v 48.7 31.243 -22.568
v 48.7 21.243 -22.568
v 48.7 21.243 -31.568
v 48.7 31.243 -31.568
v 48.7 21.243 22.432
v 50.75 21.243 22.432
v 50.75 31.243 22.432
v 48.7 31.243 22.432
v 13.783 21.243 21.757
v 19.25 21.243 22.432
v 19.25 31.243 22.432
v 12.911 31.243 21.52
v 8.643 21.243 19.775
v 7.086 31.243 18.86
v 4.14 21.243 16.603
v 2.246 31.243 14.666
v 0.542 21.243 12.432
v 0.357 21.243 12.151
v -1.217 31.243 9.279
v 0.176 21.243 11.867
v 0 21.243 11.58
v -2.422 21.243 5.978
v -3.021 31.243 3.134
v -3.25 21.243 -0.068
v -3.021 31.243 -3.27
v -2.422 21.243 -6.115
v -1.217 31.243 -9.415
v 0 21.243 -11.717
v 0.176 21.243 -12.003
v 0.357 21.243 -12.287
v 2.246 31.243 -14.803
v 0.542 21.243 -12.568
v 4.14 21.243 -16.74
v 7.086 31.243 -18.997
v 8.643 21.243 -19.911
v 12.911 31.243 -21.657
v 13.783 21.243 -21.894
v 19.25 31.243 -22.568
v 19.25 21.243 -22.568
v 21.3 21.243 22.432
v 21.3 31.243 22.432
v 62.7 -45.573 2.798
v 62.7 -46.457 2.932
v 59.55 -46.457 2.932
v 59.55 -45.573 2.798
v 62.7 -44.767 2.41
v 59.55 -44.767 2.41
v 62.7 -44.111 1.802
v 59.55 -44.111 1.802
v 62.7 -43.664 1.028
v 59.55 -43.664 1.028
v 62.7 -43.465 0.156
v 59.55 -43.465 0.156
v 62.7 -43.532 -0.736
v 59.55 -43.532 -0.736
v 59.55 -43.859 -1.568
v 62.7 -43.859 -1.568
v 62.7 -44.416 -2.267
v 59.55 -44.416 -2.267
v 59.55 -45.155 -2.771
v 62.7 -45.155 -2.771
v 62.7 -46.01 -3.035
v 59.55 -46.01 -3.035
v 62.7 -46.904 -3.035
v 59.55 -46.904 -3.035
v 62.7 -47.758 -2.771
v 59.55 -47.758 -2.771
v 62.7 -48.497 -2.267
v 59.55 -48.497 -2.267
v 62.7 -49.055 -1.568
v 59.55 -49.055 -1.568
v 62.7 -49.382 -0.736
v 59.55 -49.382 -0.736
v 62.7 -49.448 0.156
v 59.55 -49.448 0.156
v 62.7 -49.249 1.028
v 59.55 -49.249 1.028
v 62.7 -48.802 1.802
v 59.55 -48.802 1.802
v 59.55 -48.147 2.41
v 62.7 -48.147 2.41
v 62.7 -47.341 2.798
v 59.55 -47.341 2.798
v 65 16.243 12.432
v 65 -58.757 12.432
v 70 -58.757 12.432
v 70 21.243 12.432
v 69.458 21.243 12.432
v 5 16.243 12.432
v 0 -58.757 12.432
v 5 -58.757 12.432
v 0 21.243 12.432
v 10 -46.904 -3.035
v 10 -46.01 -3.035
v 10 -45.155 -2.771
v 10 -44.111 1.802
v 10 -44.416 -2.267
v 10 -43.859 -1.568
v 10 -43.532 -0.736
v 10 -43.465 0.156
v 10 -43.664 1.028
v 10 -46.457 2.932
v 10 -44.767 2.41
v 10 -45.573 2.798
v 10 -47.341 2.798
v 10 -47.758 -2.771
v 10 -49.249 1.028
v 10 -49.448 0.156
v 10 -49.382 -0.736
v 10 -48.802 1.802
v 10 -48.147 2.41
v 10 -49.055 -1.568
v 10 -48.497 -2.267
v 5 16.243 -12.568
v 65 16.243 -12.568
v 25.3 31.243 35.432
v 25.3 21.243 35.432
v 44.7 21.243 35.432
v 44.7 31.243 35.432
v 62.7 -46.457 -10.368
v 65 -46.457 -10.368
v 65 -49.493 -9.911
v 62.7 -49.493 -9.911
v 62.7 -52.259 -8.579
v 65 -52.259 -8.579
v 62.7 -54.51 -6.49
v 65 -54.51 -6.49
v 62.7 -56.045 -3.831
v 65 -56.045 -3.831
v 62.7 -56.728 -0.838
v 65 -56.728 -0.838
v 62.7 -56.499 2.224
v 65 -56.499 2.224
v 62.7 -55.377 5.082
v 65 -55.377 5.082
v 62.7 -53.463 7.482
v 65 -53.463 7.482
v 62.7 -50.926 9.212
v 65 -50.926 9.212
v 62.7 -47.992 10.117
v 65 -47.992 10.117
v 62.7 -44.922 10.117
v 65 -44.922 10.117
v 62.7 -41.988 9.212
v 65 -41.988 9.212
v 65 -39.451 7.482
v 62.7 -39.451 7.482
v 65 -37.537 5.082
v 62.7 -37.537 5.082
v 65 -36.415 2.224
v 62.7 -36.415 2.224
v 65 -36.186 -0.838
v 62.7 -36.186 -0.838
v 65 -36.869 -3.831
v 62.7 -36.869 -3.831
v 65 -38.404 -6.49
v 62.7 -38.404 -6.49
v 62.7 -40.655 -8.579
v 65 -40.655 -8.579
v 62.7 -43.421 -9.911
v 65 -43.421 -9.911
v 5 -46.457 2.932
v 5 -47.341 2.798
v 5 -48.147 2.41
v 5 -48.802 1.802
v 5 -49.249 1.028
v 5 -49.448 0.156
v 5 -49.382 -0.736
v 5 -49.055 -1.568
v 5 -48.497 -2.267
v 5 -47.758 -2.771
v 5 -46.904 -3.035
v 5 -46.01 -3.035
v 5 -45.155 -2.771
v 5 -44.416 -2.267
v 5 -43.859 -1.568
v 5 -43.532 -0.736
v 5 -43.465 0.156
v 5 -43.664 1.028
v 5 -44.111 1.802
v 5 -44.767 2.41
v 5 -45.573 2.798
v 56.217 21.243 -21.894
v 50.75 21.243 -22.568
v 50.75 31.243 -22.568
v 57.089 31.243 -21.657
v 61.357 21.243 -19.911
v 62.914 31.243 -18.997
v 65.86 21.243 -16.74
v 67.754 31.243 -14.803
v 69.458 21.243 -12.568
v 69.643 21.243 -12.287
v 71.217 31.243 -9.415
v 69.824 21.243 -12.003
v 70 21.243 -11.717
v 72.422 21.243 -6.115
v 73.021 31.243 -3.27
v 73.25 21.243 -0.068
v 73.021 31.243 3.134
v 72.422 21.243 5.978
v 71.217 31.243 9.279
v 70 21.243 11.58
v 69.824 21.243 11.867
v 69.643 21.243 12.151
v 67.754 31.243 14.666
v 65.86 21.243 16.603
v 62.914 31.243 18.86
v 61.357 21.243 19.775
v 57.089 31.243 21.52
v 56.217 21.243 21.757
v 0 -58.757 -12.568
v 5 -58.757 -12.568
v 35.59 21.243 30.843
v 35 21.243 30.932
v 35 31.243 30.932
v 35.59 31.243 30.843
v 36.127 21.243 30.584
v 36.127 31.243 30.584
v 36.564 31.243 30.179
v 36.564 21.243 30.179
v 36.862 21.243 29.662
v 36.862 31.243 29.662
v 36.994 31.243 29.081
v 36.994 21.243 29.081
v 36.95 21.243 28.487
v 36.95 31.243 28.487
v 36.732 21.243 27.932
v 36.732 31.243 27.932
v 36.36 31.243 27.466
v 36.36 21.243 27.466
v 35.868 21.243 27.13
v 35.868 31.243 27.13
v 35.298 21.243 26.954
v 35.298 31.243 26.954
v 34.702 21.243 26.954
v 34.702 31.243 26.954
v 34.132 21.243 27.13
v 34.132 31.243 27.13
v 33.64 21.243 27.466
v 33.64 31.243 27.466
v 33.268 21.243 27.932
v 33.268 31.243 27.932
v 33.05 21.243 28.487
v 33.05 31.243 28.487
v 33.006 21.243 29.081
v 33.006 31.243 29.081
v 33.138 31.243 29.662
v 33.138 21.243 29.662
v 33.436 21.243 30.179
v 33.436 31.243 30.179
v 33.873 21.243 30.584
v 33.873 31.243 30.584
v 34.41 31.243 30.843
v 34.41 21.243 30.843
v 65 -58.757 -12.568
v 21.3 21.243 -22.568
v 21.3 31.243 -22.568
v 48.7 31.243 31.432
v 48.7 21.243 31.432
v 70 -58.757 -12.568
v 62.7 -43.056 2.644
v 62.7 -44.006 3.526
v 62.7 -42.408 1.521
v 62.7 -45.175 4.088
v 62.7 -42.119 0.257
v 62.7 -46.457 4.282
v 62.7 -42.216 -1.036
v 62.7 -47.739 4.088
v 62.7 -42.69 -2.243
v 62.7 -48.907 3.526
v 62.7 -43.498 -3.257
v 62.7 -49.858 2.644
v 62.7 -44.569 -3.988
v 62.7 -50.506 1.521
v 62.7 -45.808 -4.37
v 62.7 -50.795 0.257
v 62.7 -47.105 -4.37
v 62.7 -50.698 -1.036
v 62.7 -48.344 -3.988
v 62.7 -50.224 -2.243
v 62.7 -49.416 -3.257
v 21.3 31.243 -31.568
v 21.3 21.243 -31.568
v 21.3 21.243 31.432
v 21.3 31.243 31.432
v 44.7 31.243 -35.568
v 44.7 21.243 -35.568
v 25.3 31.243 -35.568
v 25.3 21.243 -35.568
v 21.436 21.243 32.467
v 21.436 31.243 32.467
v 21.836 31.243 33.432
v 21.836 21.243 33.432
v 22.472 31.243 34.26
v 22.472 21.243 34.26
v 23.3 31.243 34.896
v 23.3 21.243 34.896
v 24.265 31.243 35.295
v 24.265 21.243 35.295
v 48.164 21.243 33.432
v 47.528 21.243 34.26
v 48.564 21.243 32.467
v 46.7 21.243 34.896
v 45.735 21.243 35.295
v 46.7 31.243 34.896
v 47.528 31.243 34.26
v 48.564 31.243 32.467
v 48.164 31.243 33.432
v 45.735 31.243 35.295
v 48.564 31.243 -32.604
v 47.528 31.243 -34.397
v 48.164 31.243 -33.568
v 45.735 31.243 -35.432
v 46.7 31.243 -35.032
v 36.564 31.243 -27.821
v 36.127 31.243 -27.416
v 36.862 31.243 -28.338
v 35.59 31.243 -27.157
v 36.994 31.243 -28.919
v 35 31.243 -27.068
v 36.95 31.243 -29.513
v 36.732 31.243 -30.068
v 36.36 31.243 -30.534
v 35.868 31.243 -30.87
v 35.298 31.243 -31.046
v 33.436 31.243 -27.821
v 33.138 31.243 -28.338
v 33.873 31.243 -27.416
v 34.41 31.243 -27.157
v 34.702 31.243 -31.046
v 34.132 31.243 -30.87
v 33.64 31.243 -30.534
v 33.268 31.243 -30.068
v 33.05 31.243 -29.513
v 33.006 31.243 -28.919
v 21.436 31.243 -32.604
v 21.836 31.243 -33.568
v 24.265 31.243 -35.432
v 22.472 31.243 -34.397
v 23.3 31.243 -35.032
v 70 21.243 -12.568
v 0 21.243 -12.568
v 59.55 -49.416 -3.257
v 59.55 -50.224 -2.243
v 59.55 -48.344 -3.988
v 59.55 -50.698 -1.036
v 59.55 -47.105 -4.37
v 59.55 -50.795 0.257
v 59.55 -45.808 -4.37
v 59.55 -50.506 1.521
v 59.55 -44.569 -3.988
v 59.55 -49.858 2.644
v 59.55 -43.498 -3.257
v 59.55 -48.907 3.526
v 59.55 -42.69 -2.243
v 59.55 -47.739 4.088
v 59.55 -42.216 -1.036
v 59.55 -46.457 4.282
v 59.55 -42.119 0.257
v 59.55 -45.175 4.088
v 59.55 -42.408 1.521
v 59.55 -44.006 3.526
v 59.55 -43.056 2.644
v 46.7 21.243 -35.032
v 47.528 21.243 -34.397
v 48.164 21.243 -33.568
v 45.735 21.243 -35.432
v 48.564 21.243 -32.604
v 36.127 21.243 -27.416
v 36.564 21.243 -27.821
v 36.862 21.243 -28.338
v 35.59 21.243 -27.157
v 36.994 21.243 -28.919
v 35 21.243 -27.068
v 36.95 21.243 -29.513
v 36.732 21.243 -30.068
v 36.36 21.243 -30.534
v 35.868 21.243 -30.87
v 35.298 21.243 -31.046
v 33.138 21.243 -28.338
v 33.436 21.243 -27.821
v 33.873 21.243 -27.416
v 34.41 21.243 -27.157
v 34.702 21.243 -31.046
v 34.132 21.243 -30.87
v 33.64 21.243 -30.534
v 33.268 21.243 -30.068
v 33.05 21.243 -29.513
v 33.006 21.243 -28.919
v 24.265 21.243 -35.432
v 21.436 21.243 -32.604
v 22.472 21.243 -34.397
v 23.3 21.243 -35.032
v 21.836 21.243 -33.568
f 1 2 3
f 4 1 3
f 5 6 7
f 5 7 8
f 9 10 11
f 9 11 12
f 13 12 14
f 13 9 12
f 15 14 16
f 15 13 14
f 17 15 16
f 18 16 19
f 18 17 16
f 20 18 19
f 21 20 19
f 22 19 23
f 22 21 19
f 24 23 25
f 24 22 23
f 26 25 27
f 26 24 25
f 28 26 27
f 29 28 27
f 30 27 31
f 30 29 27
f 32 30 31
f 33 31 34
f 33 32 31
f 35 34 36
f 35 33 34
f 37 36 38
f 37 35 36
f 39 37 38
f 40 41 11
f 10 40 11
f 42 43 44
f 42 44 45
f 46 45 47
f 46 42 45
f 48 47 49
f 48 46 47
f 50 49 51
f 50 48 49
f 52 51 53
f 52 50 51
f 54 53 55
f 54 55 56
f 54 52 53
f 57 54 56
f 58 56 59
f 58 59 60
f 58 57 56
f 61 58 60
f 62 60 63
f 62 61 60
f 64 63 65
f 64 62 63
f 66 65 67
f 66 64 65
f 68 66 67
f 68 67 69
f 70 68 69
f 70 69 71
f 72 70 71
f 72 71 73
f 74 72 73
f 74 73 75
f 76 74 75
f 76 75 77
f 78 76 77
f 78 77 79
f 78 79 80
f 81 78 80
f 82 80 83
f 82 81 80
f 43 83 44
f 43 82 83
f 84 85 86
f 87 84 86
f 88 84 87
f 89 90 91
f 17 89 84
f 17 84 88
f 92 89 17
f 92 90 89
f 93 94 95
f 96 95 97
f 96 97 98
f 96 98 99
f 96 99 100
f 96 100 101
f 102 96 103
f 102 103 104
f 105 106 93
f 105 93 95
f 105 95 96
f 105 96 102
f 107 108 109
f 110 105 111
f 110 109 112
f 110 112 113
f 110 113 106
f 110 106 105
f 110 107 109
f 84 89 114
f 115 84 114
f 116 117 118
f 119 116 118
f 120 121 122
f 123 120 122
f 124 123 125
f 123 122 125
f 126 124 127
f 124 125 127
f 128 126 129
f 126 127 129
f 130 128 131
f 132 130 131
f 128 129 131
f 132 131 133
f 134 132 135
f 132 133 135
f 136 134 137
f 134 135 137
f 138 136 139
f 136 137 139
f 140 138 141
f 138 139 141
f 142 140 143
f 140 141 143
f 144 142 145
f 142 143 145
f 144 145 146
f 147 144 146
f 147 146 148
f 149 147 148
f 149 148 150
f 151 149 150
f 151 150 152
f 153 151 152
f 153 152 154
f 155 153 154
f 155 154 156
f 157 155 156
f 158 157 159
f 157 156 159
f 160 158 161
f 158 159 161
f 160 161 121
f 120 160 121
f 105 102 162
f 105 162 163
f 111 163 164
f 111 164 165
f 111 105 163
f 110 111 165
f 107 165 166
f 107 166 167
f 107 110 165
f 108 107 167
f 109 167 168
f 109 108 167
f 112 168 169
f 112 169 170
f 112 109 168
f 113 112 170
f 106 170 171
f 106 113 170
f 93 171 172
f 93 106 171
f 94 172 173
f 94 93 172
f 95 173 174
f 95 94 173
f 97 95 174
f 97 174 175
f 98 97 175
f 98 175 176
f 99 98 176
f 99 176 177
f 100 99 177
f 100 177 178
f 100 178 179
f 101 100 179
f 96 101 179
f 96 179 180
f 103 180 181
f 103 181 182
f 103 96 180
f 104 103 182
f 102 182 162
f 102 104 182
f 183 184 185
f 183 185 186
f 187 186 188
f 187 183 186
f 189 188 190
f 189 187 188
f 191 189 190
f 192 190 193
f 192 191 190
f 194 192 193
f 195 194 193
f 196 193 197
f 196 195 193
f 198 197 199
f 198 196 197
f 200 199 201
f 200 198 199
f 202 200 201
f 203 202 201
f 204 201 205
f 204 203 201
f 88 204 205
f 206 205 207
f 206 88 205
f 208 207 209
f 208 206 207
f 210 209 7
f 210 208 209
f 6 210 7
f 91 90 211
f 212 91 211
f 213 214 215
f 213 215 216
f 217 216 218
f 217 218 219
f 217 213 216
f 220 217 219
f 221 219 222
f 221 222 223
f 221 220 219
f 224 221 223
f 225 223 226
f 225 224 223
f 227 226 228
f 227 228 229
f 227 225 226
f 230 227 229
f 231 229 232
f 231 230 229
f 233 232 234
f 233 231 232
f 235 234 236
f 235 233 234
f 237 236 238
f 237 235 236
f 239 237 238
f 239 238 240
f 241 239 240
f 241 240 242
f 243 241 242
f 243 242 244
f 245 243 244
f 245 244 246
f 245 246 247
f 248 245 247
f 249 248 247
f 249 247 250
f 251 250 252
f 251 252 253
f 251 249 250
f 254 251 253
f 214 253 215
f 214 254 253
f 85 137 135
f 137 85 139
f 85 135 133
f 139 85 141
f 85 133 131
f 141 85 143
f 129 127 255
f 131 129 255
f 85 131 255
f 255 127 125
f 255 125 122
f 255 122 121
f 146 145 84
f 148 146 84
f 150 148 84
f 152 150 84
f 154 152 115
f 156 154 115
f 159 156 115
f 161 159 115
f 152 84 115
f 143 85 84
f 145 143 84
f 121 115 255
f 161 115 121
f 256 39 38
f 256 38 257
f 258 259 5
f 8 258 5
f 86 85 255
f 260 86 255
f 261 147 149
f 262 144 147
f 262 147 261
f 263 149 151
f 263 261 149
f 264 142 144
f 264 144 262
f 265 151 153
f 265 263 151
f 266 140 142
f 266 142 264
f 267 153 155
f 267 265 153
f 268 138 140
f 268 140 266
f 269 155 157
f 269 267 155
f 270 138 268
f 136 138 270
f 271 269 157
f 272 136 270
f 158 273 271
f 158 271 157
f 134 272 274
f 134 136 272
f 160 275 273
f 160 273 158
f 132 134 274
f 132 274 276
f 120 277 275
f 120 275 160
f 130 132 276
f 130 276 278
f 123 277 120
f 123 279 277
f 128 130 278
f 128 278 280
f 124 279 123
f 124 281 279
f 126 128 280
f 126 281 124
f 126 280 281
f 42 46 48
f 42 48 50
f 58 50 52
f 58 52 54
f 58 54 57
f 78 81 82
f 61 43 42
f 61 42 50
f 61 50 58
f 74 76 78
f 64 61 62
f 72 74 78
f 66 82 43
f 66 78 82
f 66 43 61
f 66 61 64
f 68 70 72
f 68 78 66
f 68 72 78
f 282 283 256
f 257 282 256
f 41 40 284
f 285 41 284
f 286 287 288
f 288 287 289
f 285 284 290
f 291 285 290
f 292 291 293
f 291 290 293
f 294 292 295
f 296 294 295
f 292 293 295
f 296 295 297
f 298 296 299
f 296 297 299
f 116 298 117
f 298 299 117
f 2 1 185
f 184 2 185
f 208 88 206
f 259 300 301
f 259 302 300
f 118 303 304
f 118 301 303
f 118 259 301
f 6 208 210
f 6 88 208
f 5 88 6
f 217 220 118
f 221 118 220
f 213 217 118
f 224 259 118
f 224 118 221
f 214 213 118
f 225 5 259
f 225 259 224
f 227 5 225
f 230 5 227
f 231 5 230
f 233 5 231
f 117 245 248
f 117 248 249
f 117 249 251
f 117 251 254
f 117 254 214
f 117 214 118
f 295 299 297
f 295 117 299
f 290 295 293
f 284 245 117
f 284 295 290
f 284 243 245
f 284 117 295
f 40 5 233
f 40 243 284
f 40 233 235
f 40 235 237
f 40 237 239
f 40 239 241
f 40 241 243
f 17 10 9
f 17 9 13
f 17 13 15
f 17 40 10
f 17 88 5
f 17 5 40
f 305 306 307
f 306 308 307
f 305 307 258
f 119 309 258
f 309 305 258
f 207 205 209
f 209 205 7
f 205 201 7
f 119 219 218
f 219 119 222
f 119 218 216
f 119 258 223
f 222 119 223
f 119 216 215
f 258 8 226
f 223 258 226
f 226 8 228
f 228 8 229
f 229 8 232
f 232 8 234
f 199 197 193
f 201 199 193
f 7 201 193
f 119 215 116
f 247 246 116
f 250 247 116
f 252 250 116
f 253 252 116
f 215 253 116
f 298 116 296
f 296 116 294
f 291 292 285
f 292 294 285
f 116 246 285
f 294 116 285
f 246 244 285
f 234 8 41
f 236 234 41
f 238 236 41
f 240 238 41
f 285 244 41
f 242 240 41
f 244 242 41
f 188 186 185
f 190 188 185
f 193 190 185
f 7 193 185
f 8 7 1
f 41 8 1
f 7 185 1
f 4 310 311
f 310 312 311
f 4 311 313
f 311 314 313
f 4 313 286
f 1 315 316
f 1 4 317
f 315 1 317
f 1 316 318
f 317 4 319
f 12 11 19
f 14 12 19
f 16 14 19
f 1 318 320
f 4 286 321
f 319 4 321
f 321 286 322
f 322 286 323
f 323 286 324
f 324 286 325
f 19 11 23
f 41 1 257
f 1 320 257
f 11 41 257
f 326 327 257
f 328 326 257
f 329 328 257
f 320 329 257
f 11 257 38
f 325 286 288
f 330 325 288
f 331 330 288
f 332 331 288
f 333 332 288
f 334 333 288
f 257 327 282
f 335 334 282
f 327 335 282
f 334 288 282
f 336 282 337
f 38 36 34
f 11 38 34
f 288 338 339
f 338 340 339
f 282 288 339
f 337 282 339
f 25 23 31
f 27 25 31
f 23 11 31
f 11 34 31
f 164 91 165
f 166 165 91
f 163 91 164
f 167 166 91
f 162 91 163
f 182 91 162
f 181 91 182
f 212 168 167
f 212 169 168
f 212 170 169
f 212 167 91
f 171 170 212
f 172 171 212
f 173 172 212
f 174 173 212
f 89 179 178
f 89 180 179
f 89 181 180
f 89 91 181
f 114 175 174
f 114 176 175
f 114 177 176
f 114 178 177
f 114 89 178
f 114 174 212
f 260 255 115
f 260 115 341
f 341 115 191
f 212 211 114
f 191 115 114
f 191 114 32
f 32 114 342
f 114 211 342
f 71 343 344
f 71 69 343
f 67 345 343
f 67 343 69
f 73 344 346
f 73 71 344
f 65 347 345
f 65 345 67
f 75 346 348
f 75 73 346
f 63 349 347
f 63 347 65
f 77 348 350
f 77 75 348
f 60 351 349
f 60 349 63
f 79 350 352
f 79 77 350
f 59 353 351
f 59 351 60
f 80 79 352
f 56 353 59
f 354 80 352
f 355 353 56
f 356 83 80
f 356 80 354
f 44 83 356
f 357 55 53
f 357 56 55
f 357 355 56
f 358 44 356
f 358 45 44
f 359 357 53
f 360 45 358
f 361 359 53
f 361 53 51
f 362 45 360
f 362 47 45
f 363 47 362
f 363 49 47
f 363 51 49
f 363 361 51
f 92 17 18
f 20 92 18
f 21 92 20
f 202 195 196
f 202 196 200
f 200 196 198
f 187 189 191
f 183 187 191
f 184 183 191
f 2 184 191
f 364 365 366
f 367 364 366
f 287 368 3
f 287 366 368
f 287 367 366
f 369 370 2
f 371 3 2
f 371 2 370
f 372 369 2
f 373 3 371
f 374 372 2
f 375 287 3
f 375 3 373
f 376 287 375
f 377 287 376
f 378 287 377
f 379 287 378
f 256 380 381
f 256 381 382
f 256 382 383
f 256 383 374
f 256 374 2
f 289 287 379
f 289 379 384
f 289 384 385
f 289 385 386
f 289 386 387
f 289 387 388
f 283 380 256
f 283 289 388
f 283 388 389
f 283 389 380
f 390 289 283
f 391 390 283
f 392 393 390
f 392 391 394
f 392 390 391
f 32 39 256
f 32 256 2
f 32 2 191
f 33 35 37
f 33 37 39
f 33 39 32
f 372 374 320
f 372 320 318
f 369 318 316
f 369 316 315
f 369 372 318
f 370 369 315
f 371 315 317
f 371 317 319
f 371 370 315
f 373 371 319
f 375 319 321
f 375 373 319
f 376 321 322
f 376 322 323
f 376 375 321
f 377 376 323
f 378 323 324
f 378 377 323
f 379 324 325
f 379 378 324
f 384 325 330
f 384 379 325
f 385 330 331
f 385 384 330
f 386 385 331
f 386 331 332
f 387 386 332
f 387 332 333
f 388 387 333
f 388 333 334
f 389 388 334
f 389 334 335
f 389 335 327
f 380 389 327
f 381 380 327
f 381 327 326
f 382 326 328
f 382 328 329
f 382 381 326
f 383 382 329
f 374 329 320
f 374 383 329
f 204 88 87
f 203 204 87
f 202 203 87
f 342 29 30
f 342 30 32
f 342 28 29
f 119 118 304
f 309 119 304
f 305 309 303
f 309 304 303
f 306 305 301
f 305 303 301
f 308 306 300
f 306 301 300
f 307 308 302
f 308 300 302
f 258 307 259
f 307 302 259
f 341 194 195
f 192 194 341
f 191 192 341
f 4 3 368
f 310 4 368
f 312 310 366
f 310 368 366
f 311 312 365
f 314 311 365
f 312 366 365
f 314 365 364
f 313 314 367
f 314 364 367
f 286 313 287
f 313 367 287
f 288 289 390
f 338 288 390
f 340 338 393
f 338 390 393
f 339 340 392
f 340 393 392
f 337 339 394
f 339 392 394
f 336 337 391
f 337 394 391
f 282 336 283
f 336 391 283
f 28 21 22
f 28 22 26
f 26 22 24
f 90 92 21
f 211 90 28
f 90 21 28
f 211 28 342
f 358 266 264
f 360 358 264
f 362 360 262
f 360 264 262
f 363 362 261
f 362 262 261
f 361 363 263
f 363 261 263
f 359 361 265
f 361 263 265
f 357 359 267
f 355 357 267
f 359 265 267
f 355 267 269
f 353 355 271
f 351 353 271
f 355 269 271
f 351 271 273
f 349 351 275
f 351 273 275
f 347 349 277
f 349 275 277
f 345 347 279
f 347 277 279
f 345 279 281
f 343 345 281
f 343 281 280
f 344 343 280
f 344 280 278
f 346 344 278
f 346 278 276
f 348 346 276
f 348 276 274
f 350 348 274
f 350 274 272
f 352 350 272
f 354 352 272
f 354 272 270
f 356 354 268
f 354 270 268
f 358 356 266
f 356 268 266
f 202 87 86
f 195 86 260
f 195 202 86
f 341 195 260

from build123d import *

# Parameters (mm, degrees)
SKETCH_1_W       = 25
SKETCH_1_H       = 80
EXTRUDE_1_DEPTH  = 5
SKETCH_8_W       = 25
SKETCH_8_H       = 5
EXTRUDE_6_DEPTH  = 60
SKETCH_9_W       = 25
SKETCH_9_H       = 80
EXTRUDE_7_DEPTH  = 5
SKETCH_10_R      = 10.3
EXTRUDE_9_DEPTH  = 2.3
SKETCH_12_R      = 4.35
SKETCH_12_R_2    = 3
EXTRUDE_10_DEPTH = 3.15
EXTRUDE_START    = 5
SKETCH_13_R      = 3
EXTRUDE_11_DEPTH = 5
SKETCH_15_R      = 2
EXTRUDE_12_DEPTH = 10


with BuildPart() as part:
    # 草圖1 → 填料-伸長1 (new body)
    with BuildSketch(Plane(origin=(0, 0, 0), x_dir=(0, 0, -1), z_dir=(1, 0, 0))):
        with Locations((0.068306011, -18.756830601)):
            Rectangle(SKETCH_1_W, SKETCH_1_H)
    extrude(amount=EXTRUDE_1_DEPTH)

    # 草圖8 → 填料-伸長6 (add)
    with BuildSketch(Plane(origin=(5, 0, 0), x_dir=(0, 0, -1), z_dir=(1, 0, 0))):
        with Locations((0.068306011, 18.743169399)):
            Rectangle(SKETCH_8_W, SKETCH_8_H)
    extrude(amount=EXTRUDE_6_DEPTH)

    # 草圖9 → 填料-伸長7 (add)
    with BuildSketch(Plane(origin=(65, 0, 0), x_dir=(0, 0, -1), z_dir=(1, 0, 0))):
        with Locations((0.068306011, -18.756830601)):
            Rectangle(SKETCH_9_W, SKETCH_9_H)
    extrude(amount=EXTRUDE_7_DEPTH)

    # 草圖10 → 填料-伸長9 (add)
    with BuildSketch(Plane.ZY.offset(-65)):
        with Locations(Location((-0.068306011, -46.456830601, 0), (0, 0, 180))):
            Circle(SKETCH_10_R)
    extrude(amount=EXTRUDE_9_DEPTH)

    # 草圖12 → 填料-伸長10 (add)
    with BuildSketch(Plane.ZY.offset(-62.7)):
        with Locations((-0.068306011, -46.456830601)):
            Circle(SKETCH_12_R)
        with Locations((-0.068306011, -46.456830601)):
            Circle(SKETCH_12_R_2, mode=Mode.SUBTRACT)
    extrude(amount=EXTRUDE_10_DEPTH)

    # 草圖13 → 填料-伸長11 (add)
    with BuildSketch(Plane(origin=(5, 0, 0), x_dir=(0, 0, -1), z_dir=(1, 0, 0)).offset(EXTRUDE_START)):
        with Locations(Location((0.068306011, -46.456830601, 0), (0, 0, 180))):
            Circle(SKETCH_13_R)
    extrude(amount=-EXTRUDE_11_DEPTH)

    # 草圖15 → 填料-伸長12 (add)
    # profile 1 of 3: a face of its own
    with BuildSketch(Plane(origin=(0, 21.243169399, 0), x_dir=(1, 0, 0), z_dir=(0, 1, 0))):
        with BuildLine():
            Line((19.25, 22.568306011), (50.75, 22.568306011))
            ThreePointArc((50.75, 22.568306011), (73.25, 0.068306011), (50.75, -22.431693989))
            Line((50.75, -22.431693989), (19.25, -22.431693989))
            ThreePointArc((19.25, -22.431693989), (-3.25, 0.068306011), (19.25, 22.568306011))
        make_face()
    # profile 2 of 3: a face of its own
    with BuildSketch(Plane(origin=(0, 21.243169399, 0), x_dir=(1, 0, 0), z_dir=(0, 1, 0))):
        with BuildLine():
            Line((48.7, -22.431693989), (21.3, -22.431693989))
            Line((21.3, -22.431693989), (21.3, -31.431693989))
            ThreePointArc((21.3, -31.431693989), (22.471572875, -34.260121114), (25.3, -35.431693989))
            Line((25.3, -35.431693989), (44.7, -35.431693989))
            ThreePointArc((44.7, -35.431693989), (47.528427125, -34.260121114), (48.7, -31.431693989))
            Line((48.7, -31.431693989), (48.7, -22.431693989))
        make_face()
        with Locations(Location((35, -28.931693989, 0), (0, 0, 270))):
            Circle(SKETCH_15_R, mode=Mode.SUBTRACT)
    # profile 3 of 3: a face of its own
    with BuildSketch(Plane(origin=(0, 21.243169399, 0), x_dir=(1, 0, 0), z_dir=(0, 1, 0))):
        with BuildLine():
            Line((21.3, 22.568306011), (48.7, 22.568306011))
            Line((48.7, 22.568306011), (48.7, 31.568306011))
            ThreePointArc((48.7, 31.568306011), (47.528427125, 34.396733136), (44.7, 35.568306011))
            Line((44.7, 35.568306011), (25.3, 35.568306011))
            ThreePointArc((25.3, 35.568306011), (22.471572875, 34.396733136), (21.3, 31.568306011))
            Line((21.3, 31.568306011), (21.3, 22.568306011))
        make_face()
        with Locations(Location((35, 29.068306011, 0), (0, 0, 270))):
            Circle(SKETCH_15_R, mode=Mode.SUBTRACT)
    extrude(amount=EXTRUDE_12_DEPTH)


solid = part.part
